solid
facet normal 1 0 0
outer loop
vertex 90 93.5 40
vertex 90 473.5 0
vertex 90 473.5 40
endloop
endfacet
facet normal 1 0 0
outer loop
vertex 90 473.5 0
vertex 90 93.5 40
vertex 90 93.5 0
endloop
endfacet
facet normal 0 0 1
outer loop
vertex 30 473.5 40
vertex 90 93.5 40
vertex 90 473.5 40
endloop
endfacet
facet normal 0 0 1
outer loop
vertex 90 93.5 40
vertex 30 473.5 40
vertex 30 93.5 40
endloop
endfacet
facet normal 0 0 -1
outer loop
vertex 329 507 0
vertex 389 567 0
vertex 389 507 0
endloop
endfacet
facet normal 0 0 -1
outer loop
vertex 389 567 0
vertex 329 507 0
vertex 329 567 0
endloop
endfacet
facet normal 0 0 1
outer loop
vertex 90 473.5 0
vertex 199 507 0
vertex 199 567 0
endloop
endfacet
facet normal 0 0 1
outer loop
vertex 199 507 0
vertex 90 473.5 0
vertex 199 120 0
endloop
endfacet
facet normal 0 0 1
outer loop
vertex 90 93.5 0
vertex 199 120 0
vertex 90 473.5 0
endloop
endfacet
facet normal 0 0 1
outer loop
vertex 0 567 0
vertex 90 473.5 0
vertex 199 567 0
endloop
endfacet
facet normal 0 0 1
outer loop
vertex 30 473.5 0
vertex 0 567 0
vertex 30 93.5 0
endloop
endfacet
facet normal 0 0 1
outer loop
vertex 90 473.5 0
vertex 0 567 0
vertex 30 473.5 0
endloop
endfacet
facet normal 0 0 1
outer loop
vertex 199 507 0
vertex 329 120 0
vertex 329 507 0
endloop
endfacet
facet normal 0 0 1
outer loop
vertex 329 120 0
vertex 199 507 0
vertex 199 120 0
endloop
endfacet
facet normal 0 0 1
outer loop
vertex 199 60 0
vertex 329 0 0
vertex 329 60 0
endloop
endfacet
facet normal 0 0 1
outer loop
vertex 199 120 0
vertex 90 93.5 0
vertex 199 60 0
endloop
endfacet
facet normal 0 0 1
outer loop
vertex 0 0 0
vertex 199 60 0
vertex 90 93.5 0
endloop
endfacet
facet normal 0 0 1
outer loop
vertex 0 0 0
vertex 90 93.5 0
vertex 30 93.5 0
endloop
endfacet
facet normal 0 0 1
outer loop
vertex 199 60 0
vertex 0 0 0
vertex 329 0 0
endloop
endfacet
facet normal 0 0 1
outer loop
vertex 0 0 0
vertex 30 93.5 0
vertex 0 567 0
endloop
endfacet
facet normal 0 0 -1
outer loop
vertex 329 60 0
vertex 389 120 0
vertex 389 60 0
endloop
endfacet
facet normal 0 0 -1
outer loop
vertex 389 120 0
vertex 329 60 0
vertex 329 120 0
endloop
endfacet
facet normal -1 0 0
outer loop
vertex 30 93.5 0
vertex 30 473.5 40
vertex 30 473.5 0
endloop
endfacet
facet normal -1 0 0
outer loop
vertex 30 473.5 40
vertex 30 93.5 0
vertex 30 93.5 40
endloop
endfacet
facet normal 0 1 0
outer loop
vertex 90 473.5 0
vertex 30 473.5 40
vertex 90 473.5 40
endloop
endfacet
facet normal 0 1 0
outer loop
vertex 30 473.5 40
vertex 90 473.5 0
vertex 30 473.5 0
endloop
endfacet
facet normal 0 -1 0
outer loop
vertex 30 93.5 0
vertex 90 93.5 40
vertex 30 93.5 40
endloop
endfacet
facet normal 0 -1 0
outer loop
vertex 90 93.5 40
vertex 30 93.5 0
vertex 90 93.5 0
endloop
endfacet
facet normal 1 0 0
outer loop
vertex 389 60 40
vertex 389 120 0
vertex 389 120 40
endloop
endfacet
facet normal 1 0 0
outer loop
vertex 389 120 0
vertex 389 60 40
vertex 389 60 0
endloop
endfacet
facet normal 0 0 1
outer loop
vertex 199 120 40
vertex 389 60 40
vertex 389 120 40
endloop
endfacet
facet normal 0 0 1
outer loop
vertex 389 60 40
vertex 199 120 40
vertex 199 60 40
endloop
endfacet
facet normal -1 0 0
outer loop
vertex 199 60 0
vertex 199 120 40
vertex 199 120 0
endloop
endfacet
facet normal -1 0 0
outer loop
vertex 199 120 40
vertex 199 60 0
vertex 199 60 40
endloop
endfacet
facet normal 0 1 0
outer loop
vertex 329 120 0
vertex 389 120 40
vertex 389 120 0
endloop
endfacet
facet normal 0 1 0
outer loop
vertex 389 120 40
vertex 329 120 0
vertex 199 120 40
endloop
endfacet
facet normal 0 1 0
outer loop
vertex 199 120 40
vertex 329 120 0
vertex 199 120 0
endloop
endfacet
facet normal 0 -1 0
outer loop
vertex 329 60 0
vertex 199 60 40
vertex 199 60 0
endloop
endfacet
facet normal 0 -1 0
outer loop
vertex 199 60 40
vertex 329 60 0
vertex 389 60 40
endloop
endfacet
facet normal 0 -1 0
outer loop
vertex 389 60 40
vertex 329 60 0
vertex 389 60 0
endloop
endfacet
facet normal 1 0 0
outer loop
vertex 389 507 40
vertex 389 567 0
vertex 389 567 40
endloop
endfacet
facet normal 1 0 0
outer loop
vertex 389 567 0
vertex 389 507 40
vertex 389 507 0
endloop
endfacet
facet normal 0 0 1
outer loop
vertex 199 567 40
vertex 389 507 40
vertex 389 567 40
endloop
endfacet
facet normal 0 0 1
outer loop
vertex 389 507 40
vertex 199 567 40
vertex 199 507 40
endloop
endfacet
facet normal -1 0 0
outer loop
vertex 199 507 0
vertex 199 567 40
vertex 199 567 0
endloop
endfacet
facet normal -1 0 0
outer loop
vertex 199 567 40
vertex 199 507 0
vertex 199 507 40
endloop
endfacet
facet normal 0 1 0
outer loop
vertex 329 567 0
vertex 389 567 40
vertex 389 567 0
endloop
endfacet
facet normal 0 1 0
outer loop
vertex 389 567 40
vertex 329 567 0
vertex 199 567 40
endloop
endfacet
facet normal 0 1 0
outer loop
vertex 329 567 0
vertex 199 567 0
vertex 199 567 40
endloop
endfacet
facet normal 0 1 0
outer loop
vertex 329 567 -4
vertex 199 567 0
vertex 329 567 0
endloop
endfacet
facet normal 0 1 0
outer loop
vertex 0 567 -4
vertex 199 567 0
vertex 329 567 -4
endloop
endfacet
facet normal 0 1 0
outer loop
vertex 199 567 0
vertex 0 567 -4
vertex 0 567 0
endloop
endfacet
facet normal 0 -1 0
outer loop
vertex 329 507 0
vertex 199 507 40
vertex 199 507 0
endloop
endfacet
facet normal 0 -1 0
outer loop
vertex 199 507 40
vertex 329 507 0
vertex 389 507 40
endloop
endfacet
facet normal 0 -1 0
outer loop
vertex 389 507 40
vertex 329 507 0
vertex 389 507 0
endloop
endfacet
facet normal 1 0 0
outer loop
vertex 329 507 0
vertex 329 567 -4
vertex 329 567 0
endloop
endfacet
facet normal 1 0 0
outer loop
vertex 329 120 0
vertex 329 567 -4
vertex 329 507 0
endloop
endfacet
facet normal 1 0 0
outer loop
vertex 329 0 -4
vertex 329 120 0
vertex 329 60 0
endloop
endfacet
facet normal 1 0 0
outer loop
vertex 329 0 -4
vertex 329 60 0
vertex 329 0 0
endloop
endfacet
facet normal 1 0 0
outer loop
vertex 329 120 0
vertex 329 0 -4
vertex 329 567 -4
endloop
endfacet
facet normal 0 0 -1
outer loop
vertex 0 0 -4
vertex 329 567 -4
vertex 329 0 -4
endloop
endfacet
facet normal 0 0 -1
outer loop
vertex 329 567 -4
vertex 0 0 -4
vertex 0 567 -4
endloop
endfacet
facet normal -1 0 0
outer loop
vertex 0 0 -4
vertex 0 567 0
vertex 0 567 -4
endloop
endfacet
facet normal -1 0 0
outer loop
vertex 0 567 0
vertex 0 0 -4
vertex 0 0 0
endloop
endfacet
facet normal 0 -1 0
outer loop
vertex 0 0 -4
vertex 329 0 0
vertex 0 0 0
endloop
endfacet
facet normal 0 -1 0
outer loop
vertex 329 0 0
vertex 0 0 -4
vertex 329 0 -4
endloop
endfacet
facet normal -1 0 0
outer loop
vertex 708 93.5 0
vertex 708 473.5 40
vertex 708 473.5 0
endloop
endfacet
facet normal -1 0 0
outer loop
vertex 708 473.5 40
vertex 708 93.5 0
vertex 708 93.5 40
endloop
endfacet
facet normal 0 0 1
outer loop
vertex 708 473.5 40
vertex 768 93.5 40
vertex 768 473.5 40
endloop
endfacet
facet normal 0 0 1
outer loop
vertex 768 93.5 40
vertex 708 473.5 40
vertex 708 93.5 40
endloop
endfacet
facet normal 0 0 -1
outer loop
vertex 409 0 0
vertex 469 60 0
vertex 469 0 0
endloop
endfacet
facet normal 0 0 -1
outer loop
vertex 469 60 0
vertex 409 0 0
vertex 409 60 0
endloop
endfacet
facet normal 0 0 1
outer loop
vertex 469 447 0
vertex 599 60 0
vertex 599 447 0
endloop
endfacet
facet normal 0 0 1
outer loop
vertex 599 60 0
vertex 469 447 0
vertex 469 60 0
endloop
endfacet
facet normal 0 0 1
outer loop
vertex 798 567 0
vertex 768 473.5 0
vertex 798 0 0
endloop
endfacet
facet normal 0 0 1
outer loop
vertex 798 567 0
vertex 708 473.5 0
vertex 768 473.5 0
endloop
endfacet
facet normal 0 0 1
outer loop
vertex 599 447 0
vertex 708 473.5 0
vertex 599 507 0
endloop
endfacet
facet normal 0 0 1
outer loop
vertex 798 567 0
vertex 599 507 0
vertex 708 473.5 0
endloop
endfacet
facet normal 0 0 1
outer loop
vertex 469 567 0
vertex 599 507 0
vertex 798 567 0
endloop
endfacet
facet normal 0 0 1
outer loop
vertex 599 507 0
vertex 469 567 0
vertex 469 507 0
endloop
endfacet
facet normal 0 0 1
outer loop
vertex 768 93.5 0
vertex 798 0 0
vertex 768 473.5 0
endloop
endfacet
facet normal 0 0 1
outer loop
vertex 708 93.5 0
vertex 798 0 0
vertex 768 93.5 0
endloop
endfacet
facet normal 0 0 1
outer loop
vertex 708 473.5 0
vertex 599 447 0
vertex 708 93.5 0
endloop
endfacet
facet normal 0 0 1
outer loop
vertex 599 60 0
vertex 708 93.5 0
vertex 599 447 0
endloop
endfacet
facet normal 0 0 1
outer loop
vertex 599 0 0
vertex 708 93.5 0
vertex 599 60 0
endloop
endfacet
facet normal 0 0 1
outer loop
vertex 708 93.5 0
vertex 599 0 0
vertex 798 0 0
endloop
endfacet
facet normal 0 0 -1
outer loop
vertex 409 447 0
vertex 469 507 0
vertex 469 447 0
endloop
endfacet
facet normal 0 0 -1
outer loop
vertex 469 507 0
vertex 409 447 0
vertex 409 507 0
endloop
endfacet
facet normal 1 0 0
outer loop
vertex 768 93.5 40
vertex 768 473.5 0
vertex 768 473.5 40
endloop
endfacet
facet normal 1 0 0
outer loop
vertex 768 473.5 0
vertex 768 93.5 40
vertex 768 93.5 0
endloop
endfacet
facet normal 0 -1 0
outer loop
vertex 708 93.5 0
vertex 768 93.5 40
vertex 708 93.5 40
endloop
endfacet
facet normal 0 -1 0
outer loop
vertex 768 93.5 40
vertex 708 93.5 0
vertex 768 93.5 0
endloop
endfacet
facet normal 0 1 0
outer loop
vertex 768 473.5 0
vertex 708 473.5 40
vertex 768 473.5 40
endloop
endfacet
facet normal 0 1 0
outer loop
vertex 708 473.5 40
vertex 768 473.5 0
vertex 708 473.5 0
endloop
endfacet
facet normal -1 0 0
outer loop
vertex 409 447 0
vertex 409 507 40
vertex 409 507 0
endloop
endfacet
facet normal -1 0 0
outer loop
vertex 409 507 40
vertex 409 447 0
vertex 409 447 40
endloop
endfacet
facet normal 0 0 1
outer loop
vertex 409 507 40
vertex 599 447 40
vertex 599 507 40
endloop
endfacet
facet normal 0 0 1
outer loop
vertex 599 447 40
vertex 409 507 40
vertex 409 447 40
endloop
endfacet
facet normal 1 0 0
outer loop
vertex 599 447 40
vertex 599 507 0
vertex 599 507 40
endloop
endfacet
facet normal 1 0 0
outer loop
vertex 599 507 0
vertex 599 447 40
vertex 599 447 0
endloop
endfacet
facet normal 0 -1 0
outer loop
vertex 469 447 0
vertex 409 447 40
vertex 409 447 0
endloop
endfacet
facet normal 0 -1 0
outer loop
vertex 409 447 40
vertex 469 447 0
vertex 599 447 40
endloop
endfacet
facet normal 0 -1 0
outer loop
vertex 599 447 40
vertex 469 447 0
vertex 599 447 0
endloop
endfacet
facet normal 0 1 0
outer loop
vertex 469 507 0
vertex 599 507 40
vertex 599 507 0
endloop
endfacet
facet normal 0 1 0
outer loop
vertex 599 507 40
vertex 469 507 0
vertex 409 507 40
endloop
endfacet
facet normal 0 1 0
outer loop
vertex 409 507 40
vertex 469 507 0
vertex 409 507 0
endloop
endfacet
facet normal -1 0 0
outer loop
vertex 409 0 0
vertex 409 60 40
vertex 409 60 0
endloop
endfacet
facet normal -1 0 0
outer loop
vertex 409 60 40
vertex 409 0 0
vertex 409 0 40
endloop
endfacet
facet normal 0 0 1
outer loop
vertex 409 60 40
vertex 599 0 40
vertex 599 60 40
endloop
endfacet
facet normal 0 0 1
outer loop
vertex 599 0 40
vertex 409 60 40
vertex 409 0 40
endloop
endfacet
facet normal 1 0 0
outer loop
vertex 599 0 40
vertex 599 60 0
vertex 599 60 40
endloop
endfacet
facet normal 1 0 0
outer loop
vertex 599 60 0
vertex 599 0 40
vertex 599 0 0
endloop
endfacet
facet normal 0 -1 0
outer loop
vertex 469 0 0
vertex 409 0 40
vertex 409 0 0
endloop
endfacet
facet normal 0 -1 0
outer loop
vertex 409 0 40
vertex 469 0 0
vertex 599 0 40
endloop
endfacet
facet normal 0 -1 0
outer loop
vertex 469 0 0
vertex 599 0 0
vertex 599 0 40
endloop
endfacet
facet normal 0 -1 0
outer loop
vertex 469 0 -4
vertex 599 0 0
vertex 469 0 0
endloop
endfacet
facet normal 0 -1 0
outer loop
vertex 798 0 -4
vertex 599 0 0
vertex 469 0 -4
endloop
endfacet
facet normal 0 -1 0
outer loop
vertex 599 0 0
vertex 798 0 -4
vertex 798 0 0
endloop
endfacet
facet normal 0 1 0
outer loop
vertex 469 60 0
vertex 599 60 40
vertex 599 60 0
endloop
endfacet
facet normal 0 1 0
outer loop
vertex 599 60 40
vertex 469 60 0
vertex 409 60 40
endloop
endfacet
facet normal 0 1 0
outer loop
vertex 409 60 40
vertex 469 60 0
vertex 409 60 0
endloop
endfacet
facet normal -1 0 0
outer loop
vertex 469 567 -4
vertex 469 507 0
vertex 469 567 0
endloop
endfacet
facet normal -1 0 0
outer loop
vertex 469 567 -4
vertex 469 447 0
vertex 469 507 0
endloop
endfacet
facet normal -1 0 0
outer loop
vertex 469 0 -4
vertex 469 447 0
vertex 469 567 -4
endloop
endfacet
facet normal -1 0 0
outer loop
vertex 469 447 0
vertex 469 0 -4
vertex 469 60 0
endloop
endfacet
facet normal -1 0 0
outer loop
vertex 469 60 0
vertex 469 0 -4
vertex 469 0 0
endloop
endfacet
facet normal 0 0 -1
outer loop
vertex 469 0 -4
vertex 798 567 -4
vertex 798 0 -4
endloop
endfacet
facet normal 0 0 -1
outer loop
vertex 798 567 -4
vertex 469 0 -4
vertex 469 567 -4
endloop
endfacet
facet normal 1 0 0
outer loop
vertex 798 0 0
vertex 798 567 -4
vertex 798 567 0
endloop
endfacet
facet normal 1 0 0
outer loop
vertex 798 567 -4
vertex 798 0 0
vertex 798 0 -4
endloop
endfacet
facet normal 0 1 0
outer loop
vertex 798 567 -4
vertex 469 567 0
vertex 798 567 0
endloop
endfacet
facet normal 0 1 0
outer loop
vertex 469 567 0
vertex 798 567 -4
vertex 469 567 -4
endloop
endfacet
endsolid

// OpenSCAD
// Schweißtisch geschlossen

vkr_h=40;
vkr_l=380;
vkr_b=60;

p_h=4;
p_l=567;
p_b=329;

clear=1;
dist=140;

module mod() {
    // 1. bar
    color( "Olive", 1.0 ) {
        translate([0.5*vkr_b,(p_l-vkr_l)/2]) {
            cube([vkr_b,vkr_l,vkr_h], 0);
        };
    };

    // 2. bar
    translate([p_b-vkr_l/2+vkr_b,vkr_b,0]) {
        color( "Lime", 1.0 ) {
            cube([vkr_l/2,vkr_b,vkr_h], 0);
        };
    };

    // 3. bar
    translate([p_b-vkr_l/2+vkr_b,p_l-vkr_b,0]) {
        color( "ForestGreen", 1.0 ) {
            cube([vkr_l/2,vkr_b,vkr_h], 0);
        };
    };
    

    // Plate
    translate([0,0,-p_h]) {
        cube([p_b,p_l,p_h], 0);
    };
};


mod();

translate([p_b*2+dist,p_l,0]) {
    rotate(a=180, v=[0,0,1]){
        mod();
    };
};
